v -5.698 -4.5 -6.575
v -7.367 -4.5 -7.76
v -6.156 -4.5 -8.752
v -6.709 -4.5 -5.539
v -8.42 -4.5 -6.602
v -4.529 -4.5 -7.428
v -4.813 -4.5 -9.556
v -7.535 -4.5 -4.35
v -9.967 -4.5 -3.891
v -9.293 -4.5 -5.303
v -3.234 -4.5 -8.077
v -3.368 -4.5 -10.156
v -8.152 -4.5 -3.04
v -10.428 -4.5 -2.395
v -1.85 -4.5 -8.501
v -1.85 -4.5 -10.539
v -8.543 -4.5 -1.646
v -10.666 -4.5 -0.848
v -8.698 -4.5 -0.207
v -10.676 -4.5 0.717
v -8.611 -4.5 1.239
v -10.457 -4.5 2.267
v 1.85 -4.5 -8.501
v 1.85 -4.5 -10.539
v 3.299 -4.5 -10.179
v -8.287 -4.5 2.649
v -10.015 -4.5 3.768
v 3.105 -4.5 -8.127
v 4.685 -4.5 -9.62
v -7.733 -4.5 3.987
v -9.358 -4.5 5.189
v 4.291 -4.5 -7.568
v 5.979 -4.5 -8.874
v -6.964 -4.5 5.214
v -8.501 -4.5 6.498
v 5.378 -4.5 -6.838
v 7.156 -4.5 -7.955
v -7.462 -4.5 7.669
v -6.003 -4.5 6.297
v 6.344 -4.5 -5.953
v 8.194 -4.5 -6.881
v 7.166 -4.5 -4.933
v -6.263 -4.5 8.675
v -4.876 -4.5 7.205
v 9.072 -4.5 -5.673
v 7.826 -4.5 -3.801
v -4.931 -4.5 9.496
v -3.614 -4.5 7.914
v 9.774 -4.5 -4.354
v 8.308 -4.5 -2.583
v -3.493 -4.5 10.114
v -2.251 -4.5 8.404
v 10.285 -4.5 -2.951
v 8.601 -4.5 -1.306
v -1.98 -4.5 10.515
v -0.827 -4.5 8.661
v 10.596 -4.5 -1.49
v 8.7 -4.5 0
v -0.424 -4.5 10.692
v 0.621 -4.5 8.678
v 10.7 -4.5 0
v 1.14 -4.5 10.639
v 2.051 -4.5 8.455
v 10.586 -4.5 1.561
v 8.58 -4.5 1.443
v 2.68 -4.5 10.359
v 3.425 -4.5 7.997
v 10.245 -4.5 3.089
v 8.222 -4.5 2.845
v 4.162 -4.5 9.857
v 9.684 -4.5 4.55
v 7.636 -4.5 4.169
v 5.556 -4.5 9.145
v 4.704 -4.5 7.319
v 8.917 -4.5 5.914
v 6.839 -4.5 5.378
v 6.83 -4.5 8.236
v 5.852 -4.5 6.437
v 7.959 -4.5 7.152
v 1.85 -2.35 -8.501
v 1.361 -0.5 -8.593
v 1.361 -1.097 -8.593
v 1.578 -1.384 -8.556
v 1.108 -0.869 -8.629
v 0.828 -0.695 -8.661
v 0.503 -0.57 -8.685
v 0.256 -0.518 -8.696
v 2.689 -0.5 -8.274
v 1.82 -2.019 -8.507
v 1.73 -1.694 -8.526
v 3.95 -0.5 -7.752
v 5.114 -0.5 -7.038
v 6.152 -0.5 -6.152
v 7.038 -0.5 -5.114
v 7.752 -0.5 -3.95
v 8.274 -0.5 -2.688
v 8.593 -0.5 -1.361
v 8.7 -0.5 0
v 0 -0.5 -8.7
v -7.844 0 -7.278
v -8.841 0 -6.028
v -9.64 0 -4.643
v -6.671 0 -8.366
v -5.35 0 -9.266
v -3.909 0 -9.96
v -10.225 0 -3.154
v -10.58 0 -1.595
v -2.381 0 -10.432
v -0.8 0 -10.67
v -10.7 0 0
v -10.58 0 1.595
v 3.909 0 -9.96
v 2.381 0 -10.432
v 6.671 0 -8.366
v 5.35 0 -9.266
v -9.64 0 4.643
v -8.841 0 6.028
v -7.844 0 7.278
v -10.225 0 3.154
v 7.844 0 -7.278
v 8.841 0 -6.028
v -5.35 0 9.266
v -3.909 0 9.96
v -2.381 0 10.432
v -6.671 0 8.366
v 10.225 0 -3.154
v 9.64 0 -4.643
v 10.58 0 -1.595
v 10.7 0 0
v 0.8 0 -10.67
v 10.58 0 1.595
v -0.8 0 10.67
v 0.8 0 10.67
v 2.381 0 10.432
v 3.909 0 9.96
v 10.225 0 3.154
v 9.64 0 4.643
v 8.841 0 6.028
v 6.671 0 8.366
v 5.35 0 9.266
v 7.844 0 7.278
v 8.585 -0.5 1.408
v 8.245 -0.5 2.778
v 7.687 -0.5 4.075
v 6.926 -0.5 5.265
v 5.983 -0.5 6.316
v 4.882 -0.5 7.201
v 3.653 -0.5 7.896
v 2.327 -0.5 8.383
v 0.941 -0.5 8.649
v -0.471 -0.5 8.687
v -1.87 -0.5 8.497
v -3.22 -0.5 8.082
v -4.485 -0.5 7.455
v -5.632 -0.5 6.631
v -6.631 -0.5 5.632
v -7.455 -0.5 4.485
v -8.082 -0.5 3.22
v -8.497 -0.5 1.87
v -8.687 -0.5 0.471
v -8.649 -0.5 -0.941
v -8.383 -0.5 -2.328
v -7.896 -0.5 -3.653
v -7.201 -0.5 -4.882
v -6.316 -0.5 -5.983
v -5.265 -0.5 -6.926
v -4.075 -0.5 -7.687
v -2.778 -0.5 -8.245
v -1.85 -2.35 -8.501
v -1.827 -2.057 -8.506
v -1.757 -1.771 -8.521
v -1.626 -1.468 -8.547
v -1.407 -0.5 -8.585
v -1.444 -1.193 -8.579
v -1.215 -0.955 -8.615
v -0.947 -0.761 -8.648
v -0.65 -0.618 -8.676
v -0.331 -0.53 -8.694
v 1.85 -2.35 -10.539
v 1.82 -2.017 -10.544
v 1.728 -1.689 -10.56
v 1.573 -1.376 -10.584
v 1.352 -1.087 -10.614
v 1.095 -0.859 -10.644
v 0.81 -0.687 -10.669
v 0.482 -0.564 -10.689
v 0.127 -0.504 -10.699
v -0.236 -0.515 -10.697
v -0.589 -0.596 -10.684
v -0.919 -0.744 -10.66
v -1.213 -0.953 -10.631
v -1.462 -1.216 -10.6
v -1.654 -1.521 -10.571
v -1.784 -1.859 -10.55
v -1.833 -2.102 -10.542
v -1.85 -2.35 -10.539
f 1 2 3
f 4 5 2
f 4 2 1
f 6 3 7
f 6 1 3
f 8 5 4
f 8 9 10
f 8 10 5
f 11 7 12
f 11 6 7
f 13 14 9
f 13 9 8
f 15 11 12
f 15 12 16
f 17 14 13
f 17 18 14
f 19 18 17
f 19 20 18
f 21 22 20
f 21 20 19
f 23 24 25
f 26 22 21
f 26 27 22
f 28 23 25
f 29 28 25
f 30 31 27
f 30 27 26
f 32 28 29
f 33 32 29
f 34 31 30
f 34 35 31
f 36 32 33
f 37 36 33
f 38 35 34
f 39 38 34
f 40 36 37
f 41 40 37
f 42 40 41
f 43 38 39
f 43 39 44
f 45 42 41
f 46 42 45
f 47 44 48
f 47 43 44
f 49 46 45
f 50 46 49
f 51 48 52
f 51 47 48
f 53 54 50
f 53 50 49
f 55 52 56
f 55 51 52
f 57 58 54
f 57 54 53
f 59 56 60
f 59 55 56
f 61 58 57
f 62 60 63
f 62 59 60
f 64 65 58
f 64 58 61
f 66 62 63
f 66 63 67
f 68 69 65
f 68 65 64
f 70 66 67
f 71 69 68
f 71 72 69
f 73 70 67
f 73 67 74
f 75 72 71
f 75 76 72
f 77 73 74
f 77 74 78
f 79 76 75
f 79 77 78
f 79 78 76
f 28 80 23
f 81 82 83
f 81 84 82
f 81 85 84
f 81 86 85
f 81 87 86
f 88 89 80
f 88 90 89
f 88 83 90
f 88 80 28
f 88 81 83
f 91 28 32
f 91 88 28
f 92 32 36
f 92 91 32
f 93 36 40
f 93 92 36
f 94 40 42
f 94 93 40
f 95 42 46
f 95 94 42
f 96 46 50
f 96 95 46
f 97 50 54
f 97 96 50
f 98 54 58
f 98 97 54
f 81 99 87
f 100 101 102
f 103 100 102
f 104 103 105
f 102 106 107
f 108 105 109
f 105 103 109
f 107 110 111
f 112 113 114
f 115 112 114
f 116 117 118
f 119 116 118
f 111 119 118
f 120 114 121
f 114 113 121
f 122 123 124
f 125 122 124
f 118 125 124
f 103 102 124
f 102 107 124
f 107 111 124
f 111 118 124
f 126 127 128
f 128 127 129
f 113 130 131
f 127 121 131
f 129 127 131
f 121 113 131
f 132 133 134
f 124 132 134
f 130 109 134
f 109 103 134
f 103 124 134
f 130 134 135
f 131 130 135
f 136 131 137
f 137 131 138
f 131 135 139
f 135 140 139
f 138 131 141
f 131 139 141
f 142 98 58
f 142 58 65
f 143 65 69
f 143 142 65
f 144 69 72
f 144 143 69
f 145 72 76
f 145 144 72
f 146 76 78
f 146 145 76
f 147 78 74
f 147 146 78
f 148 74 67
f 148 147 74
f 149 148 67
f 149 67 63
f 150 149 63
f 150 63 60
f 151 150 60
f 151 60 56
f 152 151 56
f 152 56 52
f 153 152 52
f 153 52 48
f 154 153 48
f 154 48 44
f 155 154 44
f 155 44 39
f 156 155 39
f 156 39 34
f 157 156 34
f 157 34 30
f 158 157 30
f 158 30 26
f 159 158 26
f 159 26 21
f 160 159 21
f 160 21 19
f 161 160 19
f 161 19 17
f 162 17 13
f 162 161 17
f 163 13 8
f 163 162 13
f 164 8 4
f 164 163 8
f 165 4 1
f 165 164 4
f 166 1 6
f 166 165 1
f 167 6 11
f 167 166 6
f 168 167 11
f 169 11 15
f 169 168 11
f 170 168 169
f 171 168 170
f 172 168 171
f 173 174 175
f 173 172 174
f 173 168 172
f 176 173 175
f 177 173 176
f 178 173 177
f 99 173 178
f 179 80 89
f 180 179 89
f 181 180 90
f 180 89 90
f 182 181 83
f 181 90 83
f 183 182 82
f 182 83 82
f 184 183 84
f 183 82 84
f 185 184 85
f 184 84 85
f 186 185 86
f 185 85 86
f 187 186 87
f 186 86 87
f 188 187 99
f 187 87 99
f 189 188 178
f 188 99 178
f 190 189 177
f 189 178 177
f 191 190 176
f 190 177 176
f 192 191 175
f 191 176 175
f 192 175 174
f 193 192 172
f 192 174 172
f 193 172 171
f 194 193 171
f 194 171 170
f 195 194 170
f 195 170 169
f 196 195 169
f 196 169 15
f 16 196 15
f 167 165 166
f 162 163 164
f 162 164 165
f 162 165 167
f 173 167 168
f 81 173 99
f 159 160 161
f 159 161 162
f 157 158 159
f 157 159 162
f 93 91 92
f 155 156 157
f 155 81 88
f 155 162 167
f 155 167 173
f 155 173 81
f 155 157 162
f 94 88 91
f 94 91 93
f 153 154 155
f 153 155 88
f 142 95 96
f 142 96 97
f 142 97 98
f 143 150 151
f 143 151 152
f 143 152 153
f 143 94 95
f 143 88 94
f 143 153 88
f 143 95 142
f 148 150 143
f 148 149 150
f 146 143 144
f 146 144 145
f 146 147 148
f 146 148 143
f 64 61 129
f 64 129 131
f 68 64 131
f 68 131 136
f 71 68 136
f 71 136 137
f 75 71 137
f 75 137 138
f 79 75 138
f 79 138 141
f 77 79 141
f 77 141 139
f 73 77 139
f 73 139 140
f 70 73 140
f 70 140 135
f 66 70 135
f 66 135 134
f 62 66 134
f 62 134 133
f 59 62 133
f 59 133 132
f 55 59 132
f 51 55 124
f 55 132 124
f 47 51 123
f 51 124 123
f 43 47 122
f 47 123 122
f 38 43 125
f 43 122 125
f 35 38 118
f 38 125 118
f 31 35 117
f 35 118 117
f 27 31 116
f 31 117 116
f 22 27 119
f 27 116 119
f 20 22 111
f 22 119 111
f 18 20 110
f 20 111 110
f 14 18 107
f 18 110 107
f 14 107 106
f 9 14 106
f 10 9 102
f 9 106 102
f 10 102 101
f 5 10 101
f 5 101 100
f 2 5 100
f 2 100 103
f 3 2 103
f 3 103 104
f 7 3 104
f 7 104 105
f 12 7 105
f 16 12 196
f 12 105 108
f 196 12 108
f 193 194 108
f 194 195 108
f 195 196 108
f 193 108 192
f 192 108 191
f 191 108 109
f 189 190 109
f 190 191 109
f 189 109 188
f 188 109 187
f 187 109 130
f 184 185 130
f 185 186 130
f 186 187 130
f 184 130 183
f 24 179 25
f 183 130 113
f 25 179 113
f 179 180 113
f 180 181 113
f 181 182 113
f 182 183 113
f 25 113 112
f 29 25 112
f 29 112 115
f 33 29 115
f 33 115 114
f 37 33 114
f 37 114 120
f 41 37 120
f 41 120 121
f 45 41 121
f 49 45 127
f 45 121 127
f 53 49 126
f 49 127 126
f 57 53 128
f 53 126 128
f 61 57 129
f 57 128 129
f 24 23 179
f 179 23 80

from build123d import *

# Parameters (mm, degrees)
F2_R     = 10.7
F2_R_2   = 8.7
F3_DEPTH = 4.5
F5_DEPTH = 10.701
F6_DEPTH = 0.5


with BuildPart() as f3:
    # F2 (on Front) → F3 (new body)
    with BuildSketch(Plane.XZ):
        Circle(F2_R)
        Circle(F2_R_2, mode=Mode.SUBTRACT)
    extrude(amount=F3_DEPTH)

    # F4 (on Top) → F5 (cut, through all)
    with BuildSketch(Plane.XY):
        with BuildLine():
            Line((1.85, -4.5), (1.85, -2.35))
            ThreePointArc((1.85, -2.35), (0, -0.5), (-1.85, -2.35))
            Line((-1.85, -2.35), (-1.85, -4.5))
            Line((-1.85, -4.5), (1.85, -4.5))
        make_face()
    extrude(amount=-F5_DEPTH, mode=Mode.SUBTRACT)

    # F2 (on Front) → F6 (join)
    with BuildSketch(Plane.XZ):
        Circle(F2_R_2)
    extrude(amount=F6_DEPTH)


solid = f3.part
